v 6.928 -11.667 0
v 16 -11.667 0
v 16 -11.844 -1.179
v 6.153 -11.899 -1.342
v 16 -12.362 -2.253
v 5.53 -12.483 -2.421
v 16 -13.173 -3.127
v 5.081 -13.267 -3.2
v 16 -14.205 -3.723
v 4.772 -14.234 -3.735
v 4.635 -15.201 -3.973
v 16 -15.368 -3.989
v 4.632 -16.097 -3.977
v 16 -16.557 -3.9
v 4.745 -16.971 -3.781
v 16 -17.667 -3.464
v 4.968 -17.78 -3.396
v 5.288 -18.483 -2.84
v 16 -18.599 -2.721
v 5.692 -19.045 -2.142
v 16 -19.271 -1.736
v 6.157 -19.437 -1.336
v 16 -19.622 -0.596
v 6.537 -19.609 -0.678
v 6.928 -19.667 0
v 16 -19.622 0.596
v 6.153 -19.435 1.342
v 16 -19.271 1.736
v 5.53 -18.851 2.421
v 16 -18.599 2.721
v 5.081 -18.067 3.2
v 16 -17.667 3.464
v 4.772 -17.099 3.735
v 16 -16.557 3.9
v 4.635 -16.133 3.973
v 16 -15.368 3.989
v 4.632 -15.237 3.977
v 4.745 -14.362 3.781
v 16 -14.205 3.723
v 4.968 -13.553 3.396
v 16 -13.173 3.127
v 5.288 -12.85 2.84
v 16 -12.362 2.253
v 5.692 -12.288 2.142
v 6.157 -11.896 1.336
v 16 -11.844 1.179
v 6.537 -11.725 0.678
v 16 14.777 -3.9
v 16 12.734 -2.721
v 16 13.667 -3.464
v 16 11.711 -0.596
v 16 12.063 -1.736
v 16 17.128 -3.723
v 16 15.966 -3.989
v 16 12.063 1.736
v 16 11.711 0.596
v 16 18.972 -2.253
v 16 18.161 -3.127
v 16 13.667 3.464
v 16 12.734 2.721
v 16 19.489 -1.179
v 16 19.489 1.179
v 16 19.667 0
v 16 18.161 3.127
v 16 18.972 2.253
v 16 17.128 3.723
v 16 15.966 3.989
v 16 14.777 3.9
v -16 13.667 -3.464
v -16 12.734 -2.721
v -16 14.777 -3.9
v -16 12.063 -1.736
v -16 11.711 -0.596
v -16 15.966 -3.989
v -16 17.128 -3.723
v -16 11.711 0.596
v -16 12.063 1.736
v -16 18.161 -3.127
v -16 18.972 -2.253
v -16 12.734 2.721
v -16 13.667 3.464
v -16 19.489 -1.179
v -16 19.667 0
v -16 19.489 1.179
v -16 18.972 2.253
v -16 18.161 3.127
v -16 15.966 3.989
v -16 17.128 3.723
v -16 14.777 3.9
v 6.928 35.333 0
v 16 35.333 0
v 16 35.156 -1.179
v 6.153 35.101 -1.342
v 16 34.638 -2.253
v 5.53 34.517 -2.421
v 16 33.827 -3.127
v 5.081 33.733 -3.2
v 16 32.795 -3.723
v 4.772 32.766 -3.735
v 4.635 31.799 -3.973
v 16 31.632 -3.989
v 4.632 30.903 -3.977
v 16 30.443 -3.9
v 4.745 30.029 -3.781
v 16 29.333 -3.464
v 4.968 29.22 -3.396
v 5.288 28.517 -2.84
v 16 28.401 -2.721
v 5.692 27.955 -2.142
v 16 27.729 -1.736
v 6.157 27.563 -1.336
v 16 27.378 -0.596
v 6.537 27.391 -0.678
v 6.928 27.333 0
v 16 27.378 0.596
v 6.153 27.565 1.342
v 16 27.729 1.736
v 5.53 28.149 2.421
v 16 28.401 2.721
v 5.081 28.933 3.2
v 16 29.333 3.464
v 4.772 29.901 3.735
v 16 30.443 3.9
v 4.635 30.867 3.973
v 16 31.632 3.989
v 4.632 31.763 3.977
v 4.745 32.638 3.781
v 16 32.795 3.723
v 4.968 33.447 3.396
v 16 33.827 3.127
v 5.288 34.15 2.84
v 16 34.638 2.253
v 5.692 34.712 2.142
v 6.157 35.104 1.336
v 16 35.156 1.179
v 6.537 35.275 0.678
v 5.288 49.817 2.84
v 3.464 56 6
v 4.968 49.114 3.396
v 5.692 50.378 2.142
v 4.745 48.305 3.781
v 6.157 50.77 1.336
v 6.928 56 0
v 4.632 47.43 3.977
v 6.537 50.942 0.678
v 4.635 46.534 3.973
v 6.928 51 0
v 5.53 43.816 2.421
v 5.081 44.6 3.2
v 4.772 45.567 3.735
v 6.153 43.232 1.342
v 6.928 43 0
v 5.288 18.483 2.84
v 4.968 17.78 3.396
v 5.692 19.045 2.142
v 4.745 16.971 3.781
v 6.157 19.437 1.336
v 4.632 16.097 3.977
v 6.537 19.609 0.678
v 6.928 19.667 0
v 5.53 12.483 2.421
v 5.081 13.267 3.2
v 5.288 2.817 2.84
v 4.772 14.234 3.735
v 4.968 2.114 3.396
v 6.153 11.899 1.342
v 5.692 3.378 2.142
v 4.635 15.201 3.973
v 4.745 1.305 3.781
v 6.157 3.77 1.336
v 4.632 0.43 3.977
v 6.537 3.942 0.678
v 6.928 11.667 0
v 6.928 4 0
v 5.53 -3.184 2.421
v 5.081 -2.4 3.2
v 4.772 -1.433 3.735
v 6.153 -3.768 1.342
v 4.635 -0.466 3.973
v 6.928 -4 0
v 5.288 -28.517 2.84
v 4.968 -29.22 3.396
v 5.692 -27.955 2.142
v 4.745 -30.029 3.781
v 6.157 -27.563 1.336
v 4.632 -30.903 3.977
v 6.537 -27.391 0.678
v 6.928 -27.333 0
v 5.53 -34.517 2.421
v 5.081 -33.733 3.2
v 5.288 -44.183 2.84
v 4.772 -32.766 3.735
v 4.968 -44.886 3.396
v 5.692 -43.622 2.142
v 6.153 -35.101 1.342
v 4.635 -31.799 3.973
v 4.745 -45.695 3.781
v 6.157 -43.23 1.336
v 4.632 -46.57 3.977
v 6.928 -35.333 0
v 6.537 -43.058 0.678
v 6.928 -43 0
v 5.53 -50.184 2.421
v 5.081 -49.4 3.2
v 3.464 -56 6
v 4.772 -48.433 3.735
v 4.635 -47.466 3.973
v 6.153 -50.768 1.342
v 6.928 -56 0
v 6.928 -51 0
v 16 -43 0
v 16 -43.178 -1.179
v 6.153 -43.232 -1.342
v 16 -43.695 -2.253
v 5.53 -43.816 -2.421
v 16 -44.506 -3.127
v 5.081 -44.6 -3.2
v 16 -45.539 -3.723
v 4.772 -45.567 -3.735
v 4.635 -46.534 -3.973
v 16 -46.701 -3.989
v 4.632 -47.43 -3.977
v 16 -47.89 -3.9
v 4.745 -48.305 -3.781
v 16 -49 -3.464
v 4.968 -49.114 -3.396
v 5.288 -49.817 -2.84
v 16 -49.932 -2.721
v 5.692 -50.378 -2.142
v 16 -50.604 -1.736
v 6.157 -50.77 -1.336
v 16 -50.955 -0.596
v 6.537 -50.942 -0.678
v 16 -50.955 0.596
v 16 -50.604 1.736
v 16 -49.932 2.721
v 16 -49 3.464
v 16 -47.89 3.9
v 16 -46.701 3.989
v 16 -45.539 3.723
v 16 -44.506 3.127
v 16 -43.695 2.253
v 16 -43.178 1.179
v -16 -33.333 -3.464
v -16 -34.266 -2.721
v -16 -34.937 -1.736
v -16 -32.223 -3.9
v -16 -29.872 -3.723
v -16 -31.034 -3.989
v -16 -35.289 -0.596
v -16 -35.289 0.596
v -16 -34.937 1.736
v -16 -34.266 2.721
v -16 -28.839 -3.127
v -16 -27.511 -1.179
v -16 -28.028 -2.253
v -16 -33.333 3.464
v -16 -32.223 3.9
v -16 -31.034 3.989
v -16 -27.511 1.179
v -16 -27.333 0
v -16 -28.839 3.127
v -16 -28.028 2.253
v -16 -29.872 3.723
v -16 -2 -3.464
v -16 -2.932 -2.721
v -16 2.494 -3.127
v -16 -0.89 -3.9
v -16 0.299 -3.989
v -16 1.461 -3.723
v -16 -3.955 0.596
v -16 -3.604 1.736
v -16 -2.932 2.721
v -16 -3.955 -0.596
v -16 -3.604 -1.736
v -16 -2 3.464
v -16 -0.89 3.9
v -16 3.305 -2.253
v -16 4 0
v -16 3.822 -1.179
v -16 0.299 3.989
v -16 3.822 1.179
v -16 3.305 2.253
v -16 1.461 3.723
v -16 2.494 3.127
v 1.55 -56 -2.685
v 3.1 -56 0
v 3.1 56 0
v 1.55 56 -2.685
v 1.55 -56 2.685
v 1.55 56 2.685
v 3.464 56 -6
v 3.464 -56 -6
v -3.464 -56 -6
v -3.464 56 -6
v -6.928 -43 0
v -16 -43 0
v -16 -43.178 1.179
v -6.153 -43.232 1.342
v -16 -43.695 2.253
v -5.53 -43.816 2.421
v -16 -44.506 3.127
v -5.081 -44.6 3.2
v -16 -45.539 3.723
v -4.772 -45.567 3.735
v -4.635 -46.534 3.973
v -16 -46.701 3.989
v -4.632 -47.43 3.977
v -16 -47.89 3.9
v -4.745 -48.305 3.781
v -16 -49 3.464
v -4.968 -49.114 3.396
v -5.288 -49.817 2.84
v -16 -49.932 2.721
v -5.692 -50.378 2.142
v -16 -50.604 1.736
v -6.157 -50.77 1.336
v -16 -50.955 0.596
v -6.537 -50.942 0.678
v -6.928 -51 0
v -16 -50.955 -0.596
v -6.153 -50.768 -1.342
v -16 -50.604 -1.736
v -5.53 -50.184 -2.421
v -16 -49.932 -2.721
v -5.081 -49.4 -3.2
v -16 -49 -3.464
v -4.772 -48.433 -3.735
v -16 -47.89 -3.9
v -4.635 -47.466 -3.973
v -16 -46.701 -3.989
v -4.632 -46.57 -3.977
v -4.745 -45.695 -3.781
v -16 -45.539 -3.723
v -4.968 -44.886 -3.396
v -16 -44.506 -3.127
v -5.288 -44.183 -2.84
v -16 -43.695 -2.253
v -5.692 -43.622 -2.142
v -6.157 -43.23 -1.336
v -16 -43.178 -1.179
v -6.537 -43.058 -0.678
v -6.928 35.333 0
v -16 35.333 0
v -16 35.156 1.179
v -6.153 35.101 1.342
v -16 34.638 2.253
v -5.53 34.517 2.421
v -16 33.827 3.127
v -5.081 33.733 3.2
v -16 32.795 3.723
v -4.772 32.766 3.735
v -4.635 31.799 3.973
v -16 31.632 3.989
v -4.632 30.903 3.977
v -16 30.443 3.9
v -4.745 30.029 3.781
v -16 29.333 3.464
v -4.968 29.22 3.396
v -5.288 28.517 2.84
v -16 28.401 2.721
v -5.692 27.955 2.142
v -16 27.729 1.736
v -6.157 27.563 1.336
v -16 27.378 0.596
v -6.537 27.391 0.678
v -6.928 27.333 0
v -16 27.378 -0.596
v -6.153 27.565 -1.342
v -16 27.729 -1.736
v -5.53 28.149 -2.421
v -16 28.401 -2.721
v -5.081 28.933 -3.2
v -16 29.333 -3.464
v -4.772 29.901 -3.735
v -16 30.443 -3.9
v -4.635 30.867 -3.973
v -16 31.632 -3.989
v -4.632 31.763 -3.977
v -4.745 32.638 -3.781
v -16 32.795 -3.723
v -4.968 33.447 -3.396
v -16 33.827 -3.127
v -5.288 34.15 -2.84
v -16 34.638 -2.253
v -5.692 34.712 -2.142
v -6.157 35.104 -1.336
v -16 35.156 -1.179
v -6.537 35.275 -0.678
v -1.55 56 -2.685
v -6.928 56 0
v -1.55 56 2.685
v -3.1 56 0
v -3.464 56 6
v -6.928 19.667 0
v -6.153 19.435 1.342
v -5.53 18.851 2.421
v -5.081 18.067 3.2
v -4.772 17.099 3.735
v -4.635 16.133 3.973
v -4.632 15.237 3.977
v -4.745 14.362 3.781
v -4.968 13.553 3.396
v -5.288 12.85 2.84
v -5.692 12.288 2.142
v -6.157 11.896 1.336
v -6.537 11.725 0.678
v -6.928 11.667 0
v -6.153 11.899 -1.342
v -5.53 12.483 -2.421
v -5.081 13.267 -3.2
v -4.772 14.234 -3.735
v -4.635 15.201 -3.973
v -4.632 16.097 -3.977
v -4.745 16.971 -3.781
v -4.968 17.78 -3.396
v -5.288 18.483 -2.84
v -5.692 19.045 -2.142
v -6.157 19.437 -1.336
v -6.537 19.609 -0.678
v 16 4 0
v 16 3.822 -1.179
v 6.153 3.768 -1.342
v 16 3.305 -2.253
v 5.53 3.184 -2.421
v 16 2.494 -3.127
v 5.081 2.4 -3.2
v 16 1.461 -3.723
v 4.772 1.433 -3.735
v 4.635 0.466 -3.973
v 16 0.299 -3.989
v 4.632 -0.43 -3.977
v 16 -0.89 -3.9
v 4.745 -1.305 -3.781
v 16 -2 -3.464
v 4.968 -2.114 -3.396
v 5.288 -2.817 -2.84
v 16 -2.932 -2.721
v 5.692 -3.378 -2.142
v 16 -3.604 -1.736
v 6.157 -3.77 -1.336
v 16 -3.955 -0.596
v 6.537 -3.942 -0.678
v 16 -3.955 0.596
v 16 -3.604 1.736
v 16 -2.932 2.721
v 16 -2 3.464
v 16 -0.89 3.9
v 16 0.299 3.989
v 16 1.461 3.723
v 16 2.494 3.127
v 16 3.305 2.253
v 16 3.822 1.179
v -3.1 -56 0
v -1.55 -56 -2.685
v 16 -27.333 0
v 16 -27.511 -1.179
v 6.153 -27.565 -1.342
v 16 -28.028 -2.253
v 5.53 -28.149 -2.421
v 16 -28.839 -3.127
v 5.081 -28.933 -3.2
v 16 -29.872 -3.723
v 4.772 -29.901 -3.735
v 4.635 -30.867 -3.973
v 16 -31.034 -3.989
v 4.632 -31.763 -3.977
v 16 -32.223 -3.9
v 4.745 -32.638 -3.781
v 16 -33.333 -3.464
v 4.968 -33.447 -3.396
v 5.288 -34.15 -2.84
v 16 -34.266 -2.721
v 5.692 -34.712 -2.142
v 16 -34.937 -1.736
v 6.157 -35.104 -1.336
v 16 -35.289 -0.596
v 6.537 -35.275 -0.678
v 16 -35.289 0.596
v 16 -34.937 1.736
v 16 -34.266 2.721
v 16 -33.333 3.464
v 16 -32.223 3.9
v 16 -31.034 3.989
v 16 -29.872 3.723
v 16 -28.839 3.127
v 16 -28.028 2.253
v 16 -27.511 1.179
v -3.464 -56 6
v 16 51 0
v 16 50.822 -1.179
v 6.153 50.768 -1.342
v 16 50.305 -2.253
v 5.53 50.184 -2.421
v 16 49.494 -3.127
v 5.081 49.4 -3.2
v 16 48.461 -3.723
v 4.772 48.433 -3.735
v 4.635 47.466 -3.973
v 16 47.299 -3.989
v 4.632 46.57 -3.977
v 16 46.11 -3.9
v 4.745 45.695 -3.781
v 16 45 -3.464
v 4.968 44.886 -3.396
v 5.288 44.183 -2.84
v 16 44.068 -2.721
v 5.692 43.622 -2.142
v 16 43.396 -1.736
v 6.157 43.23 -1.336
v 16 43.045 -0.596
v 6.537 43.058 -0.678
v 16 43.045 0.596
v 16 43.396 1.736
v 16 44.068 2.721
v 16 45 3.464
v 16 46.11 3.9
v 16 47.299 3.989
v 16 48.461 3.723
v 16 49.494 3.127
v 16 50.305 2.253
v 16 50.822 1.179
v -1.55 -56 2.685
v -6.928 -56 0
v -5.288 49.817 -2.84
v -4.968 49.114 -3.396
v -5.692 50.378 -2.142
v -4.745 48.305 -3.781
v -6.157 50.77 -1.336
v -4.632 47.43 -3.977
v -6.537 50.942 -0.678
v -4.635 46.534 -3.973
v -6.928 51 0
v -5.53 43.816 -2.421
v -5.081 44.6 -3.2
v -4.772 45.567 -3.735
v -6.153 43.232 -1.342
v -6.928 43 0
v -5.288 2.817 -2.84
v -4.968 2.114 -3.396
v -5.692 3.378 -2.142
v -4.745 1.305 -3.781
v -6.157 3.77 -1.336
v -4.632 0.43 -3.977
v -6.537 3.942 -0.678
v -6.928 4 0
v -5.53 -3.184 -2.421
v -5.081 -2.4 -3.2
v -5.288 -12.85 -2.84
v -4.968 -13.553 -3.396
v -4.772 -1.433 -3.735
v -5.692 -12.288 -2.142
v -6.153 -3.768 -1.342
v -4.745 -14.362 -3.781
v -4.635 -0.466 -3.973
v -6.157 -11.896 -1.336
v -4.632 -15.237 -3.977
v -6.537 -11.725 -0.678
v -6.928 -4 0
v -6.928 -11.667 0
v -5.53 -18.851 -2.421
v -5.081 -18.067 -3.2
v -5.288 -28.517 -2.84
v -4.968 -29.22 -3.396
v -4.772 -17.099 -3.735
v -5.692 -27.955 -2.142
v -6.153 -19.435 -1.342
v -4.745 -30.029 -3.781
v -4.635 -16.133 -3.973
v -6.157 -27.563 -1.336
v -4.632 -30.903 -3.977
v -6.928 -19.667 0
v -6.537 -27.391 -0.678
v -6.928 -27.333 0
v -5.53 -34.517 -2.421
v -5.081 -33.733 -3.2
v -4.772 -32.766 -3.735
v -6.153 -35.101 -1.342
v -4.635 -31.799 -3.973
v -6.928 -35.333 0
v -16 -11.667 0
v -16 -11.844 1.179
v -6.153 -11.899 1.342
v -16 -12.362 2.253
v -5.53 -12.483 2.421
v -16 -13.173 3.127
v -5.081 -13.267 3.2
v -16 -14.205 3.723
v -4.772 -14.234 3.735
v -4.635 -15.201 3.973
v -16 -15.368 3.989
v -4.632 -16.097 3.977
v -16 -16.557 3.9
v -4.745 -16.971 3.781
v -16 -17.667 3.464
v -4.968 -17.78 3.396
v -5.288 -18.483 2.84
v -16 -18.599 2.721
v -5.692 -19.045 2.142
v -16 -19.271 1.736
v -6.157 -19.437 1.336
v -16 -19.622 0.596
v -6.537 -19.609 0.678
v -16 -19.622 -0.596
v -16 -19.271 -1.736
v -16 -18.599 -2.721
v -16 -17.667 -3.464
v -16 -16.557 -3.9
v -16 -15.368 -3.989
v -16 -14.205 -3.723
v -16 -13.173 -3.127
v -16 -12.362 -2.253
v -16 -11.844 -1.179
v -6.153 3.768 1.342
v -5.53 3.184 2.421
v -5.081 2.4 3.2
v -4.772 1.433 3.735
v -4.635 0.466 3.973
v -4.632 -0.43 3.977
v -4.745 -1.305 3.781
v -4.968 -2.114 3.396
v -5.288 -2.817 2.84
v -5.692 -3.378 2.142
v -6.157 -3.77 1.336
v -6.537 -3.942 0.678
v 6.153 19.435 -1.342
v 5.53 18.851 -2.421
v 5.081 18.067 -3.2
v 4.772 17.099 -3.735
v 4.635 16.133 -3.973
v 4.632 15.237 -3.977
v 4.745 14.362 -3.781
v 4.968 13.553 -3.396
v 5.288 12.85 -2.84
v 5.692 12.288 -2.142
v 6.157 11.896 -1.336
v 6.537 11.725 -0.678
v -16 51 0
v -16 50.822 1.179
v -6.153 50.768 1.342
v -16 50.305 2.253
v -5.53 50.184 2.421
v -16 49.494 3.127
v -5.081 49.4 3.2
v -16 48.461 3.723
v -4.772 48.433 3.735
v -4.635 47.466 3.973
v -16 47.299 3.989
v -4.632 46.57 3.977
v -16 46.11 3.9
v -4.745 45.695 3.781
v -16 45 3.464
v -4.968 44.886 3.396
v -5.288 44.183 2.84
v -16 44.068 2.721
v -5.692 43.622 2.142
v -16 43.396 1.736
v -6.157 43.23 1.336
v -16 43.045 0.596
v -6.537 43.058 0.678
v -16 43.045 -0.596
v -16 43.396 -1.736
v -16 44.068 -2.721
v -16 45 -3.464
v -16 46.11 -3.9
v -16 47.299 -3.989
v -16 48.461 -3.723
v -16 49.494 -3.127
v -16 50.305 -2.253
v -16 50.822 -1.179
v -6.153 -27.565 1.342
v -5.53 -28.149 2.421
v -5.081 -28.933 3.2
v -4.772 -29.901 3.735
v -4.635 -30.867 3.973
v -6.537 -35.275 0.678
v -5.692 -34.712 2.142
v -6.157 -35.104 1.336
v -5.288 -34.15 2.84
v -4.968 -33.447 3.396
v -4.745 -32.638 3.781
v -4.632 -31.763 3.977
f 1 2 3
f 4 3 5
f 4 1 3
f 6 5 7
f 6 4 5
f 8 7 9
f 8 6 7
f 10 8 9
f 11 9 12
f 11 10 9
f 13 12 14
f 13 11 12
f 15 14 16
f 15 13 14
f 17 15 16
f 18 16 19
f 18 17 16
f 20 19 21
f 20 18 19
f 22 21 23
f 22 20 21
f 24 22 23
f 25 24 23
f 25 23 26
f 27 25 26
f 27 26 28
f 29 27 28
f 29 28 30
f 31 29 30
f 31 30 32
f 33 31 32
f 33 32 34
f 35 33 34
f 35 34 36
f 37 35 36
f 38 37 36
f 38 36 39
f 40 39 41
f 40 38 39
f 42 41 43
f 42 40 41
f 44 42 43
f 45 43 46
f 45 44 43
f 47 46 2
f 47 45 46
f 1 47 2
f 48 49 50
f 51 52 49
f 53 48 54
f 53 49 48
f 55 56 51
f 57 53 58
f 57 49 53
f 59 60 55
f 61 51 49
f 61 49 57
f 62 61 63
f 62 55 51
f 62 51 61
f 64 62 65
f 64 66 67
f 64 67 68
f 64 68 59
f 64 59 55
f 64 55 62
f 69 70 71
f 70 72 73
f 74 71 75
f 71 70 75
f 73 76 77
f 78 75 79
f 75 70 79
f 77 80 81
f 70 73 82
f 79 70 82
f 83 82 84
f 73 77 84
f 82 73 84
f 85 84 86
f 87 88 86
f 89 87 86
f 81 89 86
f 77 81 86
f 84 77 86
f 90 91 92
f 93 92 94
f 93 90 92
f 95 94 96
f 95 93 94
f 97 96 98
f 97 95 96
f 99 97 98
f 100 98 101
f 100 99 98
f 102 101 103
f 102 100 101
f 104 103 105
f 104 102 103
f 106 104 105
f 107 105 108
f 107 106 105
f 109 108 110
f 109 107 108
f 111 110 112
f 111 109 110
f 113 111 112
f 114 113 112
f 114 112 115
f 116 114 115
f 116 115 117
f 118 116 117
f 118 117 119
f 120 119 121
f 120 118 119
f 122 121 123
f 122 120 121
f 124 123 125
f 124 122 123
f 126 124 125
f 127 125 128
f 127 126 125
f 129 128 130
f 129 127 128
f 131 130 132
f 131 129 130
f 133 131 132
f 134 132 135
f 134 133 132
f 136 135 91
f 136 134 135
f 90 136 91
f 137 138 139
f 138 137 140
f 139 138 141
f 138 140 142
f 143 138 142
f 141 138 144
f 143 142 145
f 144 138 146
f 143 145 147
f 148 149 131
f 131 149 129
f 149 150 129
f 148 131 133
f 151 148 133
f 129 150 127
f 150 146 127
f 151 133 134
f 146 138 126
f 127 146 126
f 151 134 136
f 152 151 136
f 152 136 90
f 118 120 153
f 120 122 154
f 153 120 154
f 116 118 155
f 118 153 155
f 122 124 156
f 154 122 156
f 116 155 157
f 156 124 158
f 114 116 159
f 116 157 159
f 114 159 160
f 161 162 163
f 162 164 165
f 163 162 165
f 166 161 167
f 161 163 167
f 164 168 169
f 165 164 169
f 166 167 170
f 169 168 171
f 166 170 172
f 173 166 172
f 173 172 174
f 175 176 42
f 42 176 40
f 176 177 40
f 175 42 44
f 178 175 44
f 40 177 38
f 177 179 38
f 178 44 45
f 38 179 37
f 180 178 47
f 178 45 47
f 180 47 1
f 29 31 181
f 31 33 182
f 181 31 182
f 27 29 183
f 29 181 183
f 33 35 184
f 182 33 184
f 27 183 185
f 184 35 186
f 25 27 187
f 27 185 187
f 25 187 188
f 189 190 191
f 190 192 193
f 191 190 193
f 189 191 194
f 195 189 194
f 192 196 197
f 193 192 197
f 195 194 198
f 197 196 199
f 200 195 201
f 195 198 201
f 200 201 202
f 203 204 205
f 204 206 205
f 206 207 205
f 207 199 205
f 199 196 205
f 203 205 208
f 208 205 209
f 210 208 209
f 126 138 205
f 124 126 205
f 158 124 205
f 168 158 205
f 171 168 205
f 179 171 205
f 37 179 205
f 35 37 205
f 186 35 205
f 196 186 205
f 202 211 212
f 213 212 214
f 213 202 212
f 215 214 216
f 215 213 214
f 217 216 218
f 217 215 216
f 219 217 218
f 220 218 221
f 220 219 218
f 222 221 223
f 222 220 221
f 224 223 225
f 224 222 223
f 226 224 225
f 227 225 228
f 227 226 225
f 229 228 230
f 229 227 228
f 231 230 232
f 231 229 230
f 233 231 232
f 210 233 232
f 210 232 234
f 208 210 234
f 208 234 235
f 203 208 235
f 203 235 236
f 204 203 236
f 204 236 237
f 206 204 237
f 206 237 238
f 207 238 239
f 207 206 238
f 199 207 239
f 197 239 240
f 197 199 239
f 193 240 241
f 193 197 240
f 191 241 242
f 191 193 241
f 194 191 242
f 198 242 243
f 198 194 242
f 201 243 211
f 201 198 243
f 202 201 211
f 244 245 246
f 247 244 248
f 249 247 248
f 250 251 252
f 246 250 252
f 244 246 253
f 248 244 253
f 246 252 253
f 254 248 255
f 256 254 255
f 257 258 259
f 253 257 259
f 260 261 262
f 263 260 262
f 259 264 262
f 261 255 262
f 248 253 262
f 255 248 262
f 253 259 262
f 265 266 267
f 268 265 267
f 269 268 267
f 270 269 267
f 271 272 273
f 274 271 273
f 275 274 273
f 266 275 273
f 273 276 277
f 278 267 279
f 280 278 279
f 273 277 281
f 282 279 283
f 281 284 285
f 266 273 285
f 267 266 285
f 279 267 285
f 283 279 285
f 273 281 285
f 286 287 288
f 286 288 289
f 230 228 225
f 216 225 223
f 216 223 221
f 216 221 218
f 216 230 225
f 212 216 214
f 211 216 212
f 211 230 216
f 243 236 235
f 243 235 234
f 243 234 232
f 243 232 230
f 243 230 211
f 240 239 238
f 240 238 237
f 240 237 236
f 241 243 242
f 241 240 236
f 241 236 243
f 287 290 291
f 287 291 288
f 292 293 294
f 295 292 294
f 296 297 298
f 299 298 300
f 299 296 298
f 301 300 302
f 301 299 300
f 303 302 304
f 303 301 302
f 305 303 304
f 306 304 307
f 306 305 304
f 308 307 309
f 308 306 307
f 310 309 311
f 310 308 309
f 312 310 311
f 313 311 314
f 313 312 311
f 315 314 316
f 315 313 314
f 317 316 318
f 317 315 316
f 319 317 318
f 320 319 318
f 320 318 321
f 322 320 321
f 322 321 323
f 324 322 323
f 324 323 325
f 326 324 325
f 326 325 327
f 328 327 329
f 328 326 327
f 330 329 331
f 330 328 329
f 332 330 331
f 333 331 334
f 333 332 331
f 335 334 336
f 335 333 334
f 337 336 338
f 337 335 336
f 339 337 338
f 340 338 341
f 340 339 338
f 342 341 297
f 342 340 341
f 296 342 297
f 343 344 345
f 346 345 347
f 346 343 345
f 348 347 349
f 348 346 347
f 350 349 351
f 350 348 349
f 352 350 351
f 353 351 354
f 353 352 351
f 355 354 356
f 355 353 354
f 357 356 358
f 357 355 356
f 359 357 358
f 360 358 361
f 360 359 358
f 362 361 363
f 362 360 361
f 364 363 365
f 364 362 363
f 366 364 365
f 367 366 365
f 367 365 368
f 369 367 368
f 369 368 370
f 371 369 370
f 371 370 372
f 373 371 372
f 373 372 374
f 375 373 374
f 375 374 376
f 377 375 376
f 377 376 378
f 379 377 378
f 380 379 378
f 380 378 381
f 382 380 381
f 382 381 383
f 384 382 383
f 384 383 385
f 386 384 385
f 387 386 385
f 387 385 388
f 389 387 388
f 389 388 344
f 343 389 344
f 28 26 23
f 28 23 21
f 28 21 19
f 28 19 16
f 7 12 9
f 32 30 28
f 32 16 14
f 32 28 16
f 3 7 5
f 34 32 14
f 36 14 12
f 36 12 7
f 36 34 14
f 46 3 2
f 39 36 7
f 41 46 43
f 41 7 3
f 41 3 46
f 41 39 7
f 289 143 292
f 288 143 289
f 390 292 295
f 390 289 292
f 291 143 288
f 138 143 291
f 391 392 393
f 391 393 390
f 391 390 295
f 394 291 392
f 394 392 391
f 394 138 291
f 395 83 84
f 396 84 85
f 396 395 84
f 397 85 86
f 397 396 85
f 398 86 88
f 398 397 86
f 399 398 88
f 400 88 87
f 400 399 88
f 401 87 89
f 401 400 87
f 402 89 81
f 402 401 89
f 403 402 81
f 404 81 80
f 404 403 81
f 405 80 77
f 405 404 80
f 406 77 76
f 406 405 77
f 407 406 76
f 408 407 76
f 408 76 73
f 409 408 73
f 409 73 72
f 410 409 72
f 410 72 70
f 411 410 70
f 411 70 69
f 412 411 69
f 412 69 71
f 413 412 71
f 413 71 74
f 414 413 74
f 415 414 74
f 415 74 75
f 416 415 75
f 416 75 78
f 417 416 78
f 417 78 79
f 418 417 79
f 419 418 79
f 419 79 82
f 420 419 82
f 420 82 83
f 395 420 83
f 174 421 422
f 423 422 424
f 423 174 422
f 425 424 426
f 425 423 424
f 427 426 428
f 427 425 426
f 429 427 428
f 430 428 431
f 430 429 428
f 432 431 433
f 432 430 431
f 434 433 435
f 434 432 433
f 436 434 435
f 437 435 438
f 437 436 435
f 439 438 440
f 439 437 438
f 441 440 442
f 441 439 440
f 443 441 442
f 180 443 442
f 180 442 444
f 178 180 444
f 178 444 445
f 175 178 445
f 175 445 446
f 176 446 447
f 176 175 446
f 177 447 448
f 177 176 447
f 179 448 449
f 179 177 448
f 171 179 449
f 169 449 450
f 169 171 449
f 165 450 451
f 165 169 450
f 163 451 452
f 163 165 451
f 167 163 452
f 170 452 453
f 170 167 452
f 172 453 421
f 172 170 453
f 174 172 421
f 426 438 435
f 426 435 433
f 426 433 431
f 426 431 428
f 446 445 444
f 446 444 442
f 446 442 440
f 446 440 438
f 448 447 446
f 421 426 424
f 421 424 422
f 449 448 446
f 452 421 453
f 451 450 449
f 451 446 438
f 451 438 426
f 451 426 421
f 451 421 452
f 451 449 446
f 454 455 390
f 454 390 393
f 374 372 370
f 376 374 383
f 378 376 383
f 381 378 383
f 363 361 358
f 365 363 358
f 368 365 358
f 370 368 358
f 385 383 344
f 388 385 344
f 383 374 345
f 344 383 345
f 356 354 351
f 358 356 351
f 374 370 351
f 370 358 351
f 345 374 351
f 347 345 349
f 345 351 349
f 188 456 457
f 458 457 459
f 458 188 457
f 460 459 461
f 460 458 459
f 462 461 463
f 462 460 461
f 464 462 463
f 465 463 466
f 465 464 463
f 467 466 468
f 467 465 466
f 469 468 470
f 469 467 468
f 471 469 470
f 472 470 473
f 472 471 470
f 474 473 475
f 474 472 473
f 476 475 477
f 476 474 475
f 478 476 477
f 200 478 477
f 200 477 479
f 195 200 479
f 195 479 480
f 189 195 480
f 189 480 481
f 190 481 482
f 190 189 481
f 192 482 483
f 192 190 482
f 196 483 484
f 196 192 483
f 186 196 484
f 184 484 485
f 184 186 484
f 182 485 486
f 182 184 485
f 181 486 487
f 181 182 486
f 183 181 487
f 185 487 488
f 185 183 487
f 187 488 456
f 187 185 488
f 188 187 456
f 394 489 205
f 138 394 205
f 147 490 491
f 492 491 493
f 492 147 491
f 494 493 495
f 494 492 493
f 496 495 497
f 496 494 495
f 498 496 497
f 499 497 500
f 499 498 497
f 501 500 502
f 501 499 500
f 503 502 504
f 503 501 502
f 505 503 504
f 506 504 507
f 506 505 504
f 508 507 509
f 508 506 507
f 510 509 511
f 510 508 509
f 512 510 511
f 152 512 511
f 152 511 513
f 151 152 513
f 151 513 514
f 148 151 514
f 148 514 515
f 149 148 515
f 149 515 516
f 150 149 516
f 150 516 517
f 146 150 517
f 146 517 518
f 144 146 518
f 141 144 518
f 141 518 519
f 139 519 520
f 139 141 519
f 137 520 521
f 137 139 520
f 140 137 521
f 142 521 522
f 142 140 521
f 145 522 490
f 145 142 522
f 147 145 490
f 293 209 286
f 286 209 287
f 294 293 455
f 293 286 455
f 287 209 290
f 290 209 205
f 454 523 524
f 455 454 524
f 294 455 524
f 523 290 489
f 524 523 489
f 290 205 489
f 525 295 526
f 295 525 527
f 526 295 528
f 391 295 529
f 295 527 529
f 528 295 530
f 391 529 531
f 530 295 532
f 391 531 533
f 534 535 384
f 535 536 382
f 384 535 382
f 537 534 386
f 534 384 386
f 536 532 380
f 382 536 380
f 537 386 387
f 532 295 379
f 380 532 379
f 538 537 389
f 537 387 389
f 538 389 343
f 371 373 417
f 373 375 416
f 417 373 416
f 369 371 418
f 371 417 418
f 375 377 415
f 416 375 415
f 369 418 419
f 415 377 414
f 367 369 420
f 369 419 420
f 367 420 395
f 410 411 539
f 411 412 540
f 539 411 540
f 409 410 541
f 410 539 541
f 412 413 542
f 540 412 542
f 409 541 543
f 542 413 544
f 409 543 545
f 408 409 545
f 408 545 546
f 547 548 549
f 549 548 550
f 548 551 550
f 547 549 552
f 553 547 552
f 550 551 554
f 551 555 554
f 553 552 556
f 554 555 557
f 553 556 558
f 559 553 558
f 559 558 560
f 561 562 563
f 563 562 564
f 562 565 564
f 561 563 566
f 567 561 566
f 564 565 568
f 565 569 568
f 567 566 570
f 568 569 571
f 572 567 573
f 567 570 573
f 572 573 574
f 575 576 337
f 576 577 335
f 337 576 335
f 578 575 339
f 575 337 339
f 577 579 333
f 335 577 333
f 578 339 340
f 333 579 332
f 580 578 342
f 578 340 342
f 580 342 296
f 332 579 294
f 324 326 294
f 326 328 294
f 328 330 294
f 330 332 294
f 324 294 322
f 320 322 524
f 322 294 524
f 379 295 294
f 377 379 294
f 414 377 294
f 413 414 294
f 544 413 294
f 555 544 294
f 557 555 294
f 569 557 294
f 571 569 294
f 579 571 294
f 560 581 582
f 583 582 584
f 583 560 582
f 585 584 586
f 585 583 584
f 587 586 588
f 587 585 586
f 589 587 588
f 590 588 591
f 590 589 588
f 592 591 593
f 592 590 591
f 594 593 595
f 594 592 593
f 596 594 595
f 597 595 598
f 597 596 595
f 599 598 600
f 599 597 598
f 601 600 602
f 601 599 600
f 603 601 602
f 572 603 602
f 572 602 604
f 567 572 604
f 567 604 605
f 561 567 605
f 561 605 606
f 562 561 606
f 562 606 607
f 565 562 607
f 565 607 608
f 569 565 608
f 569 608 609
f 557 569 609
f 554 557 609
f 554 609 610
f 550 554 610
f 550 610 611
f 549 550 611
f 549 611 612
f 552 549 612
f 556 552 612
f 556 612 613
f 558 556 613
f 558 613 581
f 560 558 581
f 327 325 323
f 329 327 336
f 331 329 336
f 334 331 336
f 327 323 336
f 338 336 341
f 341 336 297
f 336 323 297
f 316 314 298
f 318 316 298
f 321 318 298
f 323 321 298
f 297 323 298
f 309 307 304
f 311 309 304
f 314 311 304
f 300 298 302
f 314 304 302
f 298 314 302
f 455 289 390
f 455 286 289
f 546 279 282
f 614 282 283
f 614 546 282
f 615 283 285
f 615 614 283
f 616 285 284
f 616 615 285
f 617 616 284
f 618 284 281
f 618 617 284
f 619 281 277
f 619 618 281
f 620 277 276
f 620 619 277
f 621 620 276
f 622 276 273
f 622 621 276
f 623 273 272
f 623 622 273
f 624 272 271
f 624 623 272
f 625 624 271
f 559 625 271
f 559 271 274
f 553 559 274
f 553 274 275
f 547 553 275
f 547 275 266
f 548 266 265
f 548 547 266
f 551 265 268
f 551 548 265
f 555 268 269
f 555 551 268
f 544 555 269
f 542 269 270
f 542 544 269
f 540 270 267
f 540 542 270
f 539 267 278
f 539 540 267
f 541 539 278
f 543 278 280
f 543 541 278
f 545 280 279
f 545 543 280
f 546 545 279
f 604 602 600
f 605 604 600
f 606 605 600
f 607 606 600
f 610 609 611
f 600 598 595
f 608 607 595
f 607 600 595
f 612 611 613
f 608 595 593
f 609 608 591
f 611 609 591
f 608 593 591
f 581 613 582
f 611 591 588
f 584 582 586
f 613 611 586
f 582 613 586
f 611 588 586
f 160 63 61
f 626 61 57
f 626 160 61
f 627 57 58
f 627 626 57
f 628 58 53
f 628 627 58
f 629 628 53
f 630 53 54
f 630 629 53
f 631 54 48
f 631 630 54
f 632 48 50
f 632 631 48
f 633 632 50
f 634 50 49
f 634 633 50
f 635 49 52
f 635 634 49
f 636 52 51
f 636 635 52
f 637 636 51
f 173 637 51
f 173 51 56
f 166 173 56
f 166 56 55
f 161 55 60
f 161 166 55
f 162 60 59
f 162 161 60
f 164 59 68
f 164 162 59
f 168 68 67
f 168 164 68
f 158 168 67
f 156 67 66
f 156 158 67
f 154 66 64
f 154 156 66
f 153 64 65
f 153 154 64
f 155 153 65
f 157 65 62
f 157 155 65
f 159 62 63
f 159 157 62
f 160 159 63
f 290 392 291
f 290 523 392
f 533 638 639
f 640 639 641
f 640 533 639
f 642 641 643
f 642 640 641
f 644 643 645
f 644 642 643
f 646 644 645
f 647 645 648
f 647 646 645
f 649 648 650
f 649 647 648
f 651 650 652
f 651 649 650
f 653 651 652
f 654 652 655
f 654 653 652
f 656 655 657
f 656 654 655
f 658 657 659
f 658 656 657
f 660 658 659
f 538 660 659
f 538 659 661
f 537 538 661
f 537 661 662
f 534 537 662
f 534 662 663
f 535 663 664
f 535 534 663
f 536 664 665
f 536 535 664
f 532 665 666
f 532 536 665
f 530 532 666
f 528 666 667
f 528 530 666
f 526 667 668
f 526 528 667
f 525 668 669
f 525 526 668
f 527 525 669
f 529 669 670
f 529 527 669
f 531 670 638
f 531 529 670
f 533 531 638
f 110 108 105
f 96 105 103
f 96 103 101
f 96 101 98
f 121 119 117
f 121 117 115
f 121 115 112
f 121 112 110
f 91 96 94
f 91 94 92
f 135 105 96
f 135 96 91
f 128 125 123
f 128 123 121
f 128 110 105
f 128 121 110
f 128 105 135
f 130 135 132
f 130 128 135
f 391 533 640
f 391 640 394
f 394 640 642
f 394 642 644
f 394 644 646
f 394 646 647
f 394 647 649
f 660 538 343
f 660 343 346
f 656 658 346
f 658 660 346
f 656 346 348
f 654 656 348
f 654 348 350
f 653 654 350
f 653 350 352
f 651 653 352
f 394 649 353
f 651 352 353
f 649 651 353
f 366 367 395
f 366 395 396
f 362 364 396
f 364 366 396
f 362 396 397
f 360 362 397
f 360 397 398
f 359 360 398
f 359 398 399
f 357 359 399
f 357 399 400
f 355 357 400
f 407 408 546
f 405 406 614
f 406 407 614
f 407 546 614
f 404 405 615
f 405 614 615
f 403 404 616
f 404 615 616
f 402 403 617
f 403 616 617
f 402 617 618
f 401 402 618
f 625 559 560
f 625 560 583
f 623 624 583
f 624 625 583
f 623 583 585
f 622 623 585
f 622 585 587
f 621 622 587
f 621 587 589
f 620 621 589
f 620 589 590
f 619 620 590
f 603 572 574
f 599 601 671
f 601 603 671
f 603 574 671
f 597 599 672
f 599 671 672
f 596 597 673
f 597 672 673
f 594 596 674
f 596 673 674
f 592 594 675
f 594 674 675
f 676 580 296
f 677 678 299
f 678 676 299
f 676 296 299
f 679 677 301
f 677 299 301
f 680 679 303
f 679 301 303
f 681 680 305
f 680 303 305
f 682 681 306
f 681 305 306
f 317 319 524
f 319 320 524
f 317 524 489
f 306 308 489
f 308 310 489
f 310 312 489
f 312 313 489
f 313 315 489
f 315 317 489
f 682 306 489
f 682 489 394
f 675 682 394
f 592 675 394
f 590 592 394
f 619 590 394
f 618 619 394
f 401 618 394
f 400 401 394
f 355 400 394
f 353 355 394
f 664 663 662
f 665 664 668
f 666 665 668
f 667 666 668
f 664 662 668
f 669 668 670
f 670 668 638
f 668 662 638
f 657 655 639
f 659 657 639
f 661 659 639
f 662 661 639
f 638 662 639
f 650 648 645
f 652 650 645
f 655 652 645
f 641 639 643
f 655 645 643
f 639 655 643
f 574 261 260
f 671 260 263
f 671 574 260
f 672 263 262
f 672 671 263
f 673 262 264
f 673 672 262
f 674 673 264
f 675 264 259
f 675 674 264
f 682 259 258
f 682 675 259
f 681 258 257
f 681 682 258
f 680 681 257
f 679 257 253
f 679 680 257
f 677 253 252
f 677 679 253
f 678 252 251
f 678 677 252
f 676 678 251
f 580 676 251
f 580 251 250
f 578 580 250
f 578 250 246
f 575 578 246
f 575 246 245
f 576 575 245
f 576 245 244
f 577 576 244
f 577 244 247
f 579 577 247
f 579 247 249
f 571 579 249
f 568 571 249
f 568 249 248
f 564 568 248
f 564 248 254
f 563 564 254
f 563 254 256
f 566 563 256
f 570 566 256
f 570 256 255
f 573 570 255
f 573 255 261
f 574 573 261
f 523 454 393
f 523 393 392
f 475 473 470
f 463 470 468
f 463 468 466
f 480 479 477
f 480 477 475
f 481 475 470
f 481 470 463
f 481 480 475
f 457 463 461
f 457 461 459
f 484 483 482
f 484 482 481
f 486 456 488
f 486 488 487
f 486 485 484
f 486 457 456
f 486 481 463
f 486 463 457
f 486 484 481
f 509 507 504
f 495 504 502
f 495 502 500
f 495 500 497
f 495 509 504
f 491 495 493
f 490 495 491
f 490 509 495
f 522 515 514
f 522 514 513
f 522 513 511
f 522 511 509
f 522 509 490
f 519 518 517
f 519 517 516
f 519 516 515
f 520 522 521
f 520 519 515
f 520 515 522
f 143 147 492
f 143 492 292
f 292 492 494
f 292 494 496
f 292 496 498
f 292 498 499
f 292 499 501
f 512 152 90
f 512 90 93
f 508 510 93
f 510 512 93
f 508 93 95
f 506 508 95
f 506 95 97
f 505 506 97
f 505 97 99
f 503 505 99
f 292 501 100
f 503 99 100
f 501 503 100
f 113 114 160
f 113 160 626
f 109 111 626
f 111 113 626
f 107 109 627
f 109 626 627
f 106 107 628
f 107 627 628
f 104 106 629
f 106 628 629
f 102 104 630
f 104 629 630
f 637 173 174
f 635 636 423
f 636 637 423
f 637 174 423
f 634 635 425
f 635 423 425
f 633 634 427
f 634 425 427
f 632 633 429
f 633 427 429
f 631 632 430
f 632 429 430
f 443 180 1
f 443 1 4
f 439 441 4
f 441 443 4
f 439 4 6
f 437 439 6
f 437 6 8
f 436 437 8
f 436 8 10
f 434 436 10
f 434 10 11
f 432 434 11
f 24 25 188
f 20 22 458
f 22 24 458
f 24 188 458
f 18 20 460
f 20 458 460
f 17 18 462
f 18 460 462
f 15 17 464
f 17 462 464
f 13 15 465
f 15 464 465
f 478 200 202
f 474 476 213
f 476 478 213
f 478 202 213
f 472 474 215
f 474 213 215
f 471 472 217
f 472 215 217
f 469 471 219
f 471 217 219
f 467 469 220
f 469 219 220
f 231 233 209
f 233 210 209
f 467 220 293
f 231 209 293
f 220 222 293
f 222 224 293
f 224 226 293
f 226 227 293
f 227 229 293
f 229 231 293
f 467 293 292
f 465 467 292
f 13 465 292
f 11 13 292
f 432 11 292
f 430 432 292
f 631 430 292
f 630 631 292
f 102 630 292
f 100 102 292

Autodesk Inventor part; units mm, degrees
ref_plane "YZ Plane" through (0, 0, 0) normal (1, 0, 0) x (0, 1, 0)
ref_plane "XZ Plane" through (0, 0, 0) normal (0, 1, 0) x (-1, 0, 0)
ref_plane "XY Plane" through (0, 0, 0) normal (0, 0, 1) x (1, 0, 0)
sketch "Outer Diameter Sketch" plane through (0, 0, 0) normal (0, 1, 0) x (-1, 0, 0)
  line L0 (0, -28.0163) -> (0, 28.3344) construction
  line L1 (17.1062, 0) -> (-23.8822, 0) construction
  line L2 (3.4641, -6) -> (6.9282, 0)
  line L3 (6.9282, 0) -> (3.4641, 6)
  line L4 (3.4641, 6) -> (-3.4641, 6)
  line L5 (-3.4641, 6) -> (-6.9282, 0)
  line L6 (-6.9282, 0) -> (-3.4641, -6)
  line L7 (-3.4641, -6) -> (3.4641, -6)
  line L8 (0, -6) -> (0, 6) construction
  line L9 (-6.9282, 0) -> (6.9282, 0) construction
  point P0 (0, 0)
  dimension "d23" = 120
  dimension "d25" = 120
  dimension "d27" = 120
  dimension "d29" = 120
  dimension "d31" = 120
  dimension "d32" = 12
extrude "Outer Diameter Extrusion" add sketch "Outer Diameter Sketch" along normal mid plane 112
sketch "Sketch2" plane through (0, 0, 0) normal (1, 0, 0) x (0, 1, 0)
  circle A0 centre (0, 0) radius 4
  line L0 (-56, 0) -> (0, 0) construction
  line L1 (0, 0) -> (56, 0) construction
  circle A1 centre (15.6667, 0) radius 4
  circle A2 centre (31.3333, 0) radius 4
  circle A3 centre (47, 0) radius 4
  circle A4 centre (-15.6667, 0) radius 4
  circle A5 centre (0, 0) radius 4
  circle A6 centre (15.6667, 0) radius 4
  circle A7 centre (31.3333, 0) radius 4
  circle A8 centre (-31.3333, 0) radius 4
  circle A9 centre (-15.6667, 0) radius 4
  circle A10 centre (0, 0) radius 4
  circle A11 centre (15.6667, 0) radius 4
  circle A12 centre (-47, 0) radius 4
  circle A13 centre (-31.3333, 0) radius 4
  circle A14 centre (-15.6667, 0) radius 4
  circle A15 centre (0, 0) radius 4
  dimension "d3" = 8
  dimension "d5" = 112
  dimension "d8" = 15.6667
  dimension "d11" = 15.6667
extrude "Extrusion2" add sketch "Sketch2" along normal mid plane 32
sketch "Sketch3" plane through (0, -56, 0) normal (0, -1, 0) x (1, 0, 0)
  line L0 (1.55, -2.6847) -> (-1.55, -2.6847)
  line L1 (-1.55, -2.6847) -> (-3.1, 0)
  line L2 (-3.1, 0) -> (-1.55, 2.6847)
  line L3 (-1.55, 2.6847) -> (1.55, 2.6847)
  line L4 (1.55, 2.6847) -> (3.1, 0)
  line L5 (3.1, 0) -> (1.55, -2.6847)
  line L6 (3.1, 0) -> (-3.1, 0) construction
  line L7 (0, 2.6847) -> (0, -2.6847) construction
  line L8 (10.3659, 0) -> (-11.745, 0) construction
  line L9 (0, -9.4896) -> (0, 9.303) construction
  point P0 (0, 0)
  dimension "d33" = 3.1
  dimension "d34" = 3.1
  dimension "d35" = 120
  dimension "d36" = 3.1
  dimension "d37" = 120
  dimension "d38" = 3.1
  dimension "d39" = 120
  dimension "d40" = 3.1
  dimension "d41" = 120
extrude "Extrusion3" cut sketch "Sketch3" against normal up to surface (112 mm away)
equation "\"d1\" = outL"
equation "\"d3\" = pegD"
equation "\"d5\" = outL"
equation "\"d14\" = pegL + 2 * outD"
equation "\"d33\" = inhexSL"
equation "\"d34\" = inhexSL"
equation "\"d36\" = inhexSL"
equation "\"d38\" = inhexSL"
equation "\"d40\" = inhexSL"
equation "\"d42\" = pegL + 2 * outD"
equation "\"outD\" = 12"
equation "\"inhexSL\" = 3.1"
equation "\"outL\" = 112"
equation "\"pegL\" = 8"
equation "\"pegD\" = 8"
equation "\"outhexSL\" = 5"
properties part number "Peg Spinner"
